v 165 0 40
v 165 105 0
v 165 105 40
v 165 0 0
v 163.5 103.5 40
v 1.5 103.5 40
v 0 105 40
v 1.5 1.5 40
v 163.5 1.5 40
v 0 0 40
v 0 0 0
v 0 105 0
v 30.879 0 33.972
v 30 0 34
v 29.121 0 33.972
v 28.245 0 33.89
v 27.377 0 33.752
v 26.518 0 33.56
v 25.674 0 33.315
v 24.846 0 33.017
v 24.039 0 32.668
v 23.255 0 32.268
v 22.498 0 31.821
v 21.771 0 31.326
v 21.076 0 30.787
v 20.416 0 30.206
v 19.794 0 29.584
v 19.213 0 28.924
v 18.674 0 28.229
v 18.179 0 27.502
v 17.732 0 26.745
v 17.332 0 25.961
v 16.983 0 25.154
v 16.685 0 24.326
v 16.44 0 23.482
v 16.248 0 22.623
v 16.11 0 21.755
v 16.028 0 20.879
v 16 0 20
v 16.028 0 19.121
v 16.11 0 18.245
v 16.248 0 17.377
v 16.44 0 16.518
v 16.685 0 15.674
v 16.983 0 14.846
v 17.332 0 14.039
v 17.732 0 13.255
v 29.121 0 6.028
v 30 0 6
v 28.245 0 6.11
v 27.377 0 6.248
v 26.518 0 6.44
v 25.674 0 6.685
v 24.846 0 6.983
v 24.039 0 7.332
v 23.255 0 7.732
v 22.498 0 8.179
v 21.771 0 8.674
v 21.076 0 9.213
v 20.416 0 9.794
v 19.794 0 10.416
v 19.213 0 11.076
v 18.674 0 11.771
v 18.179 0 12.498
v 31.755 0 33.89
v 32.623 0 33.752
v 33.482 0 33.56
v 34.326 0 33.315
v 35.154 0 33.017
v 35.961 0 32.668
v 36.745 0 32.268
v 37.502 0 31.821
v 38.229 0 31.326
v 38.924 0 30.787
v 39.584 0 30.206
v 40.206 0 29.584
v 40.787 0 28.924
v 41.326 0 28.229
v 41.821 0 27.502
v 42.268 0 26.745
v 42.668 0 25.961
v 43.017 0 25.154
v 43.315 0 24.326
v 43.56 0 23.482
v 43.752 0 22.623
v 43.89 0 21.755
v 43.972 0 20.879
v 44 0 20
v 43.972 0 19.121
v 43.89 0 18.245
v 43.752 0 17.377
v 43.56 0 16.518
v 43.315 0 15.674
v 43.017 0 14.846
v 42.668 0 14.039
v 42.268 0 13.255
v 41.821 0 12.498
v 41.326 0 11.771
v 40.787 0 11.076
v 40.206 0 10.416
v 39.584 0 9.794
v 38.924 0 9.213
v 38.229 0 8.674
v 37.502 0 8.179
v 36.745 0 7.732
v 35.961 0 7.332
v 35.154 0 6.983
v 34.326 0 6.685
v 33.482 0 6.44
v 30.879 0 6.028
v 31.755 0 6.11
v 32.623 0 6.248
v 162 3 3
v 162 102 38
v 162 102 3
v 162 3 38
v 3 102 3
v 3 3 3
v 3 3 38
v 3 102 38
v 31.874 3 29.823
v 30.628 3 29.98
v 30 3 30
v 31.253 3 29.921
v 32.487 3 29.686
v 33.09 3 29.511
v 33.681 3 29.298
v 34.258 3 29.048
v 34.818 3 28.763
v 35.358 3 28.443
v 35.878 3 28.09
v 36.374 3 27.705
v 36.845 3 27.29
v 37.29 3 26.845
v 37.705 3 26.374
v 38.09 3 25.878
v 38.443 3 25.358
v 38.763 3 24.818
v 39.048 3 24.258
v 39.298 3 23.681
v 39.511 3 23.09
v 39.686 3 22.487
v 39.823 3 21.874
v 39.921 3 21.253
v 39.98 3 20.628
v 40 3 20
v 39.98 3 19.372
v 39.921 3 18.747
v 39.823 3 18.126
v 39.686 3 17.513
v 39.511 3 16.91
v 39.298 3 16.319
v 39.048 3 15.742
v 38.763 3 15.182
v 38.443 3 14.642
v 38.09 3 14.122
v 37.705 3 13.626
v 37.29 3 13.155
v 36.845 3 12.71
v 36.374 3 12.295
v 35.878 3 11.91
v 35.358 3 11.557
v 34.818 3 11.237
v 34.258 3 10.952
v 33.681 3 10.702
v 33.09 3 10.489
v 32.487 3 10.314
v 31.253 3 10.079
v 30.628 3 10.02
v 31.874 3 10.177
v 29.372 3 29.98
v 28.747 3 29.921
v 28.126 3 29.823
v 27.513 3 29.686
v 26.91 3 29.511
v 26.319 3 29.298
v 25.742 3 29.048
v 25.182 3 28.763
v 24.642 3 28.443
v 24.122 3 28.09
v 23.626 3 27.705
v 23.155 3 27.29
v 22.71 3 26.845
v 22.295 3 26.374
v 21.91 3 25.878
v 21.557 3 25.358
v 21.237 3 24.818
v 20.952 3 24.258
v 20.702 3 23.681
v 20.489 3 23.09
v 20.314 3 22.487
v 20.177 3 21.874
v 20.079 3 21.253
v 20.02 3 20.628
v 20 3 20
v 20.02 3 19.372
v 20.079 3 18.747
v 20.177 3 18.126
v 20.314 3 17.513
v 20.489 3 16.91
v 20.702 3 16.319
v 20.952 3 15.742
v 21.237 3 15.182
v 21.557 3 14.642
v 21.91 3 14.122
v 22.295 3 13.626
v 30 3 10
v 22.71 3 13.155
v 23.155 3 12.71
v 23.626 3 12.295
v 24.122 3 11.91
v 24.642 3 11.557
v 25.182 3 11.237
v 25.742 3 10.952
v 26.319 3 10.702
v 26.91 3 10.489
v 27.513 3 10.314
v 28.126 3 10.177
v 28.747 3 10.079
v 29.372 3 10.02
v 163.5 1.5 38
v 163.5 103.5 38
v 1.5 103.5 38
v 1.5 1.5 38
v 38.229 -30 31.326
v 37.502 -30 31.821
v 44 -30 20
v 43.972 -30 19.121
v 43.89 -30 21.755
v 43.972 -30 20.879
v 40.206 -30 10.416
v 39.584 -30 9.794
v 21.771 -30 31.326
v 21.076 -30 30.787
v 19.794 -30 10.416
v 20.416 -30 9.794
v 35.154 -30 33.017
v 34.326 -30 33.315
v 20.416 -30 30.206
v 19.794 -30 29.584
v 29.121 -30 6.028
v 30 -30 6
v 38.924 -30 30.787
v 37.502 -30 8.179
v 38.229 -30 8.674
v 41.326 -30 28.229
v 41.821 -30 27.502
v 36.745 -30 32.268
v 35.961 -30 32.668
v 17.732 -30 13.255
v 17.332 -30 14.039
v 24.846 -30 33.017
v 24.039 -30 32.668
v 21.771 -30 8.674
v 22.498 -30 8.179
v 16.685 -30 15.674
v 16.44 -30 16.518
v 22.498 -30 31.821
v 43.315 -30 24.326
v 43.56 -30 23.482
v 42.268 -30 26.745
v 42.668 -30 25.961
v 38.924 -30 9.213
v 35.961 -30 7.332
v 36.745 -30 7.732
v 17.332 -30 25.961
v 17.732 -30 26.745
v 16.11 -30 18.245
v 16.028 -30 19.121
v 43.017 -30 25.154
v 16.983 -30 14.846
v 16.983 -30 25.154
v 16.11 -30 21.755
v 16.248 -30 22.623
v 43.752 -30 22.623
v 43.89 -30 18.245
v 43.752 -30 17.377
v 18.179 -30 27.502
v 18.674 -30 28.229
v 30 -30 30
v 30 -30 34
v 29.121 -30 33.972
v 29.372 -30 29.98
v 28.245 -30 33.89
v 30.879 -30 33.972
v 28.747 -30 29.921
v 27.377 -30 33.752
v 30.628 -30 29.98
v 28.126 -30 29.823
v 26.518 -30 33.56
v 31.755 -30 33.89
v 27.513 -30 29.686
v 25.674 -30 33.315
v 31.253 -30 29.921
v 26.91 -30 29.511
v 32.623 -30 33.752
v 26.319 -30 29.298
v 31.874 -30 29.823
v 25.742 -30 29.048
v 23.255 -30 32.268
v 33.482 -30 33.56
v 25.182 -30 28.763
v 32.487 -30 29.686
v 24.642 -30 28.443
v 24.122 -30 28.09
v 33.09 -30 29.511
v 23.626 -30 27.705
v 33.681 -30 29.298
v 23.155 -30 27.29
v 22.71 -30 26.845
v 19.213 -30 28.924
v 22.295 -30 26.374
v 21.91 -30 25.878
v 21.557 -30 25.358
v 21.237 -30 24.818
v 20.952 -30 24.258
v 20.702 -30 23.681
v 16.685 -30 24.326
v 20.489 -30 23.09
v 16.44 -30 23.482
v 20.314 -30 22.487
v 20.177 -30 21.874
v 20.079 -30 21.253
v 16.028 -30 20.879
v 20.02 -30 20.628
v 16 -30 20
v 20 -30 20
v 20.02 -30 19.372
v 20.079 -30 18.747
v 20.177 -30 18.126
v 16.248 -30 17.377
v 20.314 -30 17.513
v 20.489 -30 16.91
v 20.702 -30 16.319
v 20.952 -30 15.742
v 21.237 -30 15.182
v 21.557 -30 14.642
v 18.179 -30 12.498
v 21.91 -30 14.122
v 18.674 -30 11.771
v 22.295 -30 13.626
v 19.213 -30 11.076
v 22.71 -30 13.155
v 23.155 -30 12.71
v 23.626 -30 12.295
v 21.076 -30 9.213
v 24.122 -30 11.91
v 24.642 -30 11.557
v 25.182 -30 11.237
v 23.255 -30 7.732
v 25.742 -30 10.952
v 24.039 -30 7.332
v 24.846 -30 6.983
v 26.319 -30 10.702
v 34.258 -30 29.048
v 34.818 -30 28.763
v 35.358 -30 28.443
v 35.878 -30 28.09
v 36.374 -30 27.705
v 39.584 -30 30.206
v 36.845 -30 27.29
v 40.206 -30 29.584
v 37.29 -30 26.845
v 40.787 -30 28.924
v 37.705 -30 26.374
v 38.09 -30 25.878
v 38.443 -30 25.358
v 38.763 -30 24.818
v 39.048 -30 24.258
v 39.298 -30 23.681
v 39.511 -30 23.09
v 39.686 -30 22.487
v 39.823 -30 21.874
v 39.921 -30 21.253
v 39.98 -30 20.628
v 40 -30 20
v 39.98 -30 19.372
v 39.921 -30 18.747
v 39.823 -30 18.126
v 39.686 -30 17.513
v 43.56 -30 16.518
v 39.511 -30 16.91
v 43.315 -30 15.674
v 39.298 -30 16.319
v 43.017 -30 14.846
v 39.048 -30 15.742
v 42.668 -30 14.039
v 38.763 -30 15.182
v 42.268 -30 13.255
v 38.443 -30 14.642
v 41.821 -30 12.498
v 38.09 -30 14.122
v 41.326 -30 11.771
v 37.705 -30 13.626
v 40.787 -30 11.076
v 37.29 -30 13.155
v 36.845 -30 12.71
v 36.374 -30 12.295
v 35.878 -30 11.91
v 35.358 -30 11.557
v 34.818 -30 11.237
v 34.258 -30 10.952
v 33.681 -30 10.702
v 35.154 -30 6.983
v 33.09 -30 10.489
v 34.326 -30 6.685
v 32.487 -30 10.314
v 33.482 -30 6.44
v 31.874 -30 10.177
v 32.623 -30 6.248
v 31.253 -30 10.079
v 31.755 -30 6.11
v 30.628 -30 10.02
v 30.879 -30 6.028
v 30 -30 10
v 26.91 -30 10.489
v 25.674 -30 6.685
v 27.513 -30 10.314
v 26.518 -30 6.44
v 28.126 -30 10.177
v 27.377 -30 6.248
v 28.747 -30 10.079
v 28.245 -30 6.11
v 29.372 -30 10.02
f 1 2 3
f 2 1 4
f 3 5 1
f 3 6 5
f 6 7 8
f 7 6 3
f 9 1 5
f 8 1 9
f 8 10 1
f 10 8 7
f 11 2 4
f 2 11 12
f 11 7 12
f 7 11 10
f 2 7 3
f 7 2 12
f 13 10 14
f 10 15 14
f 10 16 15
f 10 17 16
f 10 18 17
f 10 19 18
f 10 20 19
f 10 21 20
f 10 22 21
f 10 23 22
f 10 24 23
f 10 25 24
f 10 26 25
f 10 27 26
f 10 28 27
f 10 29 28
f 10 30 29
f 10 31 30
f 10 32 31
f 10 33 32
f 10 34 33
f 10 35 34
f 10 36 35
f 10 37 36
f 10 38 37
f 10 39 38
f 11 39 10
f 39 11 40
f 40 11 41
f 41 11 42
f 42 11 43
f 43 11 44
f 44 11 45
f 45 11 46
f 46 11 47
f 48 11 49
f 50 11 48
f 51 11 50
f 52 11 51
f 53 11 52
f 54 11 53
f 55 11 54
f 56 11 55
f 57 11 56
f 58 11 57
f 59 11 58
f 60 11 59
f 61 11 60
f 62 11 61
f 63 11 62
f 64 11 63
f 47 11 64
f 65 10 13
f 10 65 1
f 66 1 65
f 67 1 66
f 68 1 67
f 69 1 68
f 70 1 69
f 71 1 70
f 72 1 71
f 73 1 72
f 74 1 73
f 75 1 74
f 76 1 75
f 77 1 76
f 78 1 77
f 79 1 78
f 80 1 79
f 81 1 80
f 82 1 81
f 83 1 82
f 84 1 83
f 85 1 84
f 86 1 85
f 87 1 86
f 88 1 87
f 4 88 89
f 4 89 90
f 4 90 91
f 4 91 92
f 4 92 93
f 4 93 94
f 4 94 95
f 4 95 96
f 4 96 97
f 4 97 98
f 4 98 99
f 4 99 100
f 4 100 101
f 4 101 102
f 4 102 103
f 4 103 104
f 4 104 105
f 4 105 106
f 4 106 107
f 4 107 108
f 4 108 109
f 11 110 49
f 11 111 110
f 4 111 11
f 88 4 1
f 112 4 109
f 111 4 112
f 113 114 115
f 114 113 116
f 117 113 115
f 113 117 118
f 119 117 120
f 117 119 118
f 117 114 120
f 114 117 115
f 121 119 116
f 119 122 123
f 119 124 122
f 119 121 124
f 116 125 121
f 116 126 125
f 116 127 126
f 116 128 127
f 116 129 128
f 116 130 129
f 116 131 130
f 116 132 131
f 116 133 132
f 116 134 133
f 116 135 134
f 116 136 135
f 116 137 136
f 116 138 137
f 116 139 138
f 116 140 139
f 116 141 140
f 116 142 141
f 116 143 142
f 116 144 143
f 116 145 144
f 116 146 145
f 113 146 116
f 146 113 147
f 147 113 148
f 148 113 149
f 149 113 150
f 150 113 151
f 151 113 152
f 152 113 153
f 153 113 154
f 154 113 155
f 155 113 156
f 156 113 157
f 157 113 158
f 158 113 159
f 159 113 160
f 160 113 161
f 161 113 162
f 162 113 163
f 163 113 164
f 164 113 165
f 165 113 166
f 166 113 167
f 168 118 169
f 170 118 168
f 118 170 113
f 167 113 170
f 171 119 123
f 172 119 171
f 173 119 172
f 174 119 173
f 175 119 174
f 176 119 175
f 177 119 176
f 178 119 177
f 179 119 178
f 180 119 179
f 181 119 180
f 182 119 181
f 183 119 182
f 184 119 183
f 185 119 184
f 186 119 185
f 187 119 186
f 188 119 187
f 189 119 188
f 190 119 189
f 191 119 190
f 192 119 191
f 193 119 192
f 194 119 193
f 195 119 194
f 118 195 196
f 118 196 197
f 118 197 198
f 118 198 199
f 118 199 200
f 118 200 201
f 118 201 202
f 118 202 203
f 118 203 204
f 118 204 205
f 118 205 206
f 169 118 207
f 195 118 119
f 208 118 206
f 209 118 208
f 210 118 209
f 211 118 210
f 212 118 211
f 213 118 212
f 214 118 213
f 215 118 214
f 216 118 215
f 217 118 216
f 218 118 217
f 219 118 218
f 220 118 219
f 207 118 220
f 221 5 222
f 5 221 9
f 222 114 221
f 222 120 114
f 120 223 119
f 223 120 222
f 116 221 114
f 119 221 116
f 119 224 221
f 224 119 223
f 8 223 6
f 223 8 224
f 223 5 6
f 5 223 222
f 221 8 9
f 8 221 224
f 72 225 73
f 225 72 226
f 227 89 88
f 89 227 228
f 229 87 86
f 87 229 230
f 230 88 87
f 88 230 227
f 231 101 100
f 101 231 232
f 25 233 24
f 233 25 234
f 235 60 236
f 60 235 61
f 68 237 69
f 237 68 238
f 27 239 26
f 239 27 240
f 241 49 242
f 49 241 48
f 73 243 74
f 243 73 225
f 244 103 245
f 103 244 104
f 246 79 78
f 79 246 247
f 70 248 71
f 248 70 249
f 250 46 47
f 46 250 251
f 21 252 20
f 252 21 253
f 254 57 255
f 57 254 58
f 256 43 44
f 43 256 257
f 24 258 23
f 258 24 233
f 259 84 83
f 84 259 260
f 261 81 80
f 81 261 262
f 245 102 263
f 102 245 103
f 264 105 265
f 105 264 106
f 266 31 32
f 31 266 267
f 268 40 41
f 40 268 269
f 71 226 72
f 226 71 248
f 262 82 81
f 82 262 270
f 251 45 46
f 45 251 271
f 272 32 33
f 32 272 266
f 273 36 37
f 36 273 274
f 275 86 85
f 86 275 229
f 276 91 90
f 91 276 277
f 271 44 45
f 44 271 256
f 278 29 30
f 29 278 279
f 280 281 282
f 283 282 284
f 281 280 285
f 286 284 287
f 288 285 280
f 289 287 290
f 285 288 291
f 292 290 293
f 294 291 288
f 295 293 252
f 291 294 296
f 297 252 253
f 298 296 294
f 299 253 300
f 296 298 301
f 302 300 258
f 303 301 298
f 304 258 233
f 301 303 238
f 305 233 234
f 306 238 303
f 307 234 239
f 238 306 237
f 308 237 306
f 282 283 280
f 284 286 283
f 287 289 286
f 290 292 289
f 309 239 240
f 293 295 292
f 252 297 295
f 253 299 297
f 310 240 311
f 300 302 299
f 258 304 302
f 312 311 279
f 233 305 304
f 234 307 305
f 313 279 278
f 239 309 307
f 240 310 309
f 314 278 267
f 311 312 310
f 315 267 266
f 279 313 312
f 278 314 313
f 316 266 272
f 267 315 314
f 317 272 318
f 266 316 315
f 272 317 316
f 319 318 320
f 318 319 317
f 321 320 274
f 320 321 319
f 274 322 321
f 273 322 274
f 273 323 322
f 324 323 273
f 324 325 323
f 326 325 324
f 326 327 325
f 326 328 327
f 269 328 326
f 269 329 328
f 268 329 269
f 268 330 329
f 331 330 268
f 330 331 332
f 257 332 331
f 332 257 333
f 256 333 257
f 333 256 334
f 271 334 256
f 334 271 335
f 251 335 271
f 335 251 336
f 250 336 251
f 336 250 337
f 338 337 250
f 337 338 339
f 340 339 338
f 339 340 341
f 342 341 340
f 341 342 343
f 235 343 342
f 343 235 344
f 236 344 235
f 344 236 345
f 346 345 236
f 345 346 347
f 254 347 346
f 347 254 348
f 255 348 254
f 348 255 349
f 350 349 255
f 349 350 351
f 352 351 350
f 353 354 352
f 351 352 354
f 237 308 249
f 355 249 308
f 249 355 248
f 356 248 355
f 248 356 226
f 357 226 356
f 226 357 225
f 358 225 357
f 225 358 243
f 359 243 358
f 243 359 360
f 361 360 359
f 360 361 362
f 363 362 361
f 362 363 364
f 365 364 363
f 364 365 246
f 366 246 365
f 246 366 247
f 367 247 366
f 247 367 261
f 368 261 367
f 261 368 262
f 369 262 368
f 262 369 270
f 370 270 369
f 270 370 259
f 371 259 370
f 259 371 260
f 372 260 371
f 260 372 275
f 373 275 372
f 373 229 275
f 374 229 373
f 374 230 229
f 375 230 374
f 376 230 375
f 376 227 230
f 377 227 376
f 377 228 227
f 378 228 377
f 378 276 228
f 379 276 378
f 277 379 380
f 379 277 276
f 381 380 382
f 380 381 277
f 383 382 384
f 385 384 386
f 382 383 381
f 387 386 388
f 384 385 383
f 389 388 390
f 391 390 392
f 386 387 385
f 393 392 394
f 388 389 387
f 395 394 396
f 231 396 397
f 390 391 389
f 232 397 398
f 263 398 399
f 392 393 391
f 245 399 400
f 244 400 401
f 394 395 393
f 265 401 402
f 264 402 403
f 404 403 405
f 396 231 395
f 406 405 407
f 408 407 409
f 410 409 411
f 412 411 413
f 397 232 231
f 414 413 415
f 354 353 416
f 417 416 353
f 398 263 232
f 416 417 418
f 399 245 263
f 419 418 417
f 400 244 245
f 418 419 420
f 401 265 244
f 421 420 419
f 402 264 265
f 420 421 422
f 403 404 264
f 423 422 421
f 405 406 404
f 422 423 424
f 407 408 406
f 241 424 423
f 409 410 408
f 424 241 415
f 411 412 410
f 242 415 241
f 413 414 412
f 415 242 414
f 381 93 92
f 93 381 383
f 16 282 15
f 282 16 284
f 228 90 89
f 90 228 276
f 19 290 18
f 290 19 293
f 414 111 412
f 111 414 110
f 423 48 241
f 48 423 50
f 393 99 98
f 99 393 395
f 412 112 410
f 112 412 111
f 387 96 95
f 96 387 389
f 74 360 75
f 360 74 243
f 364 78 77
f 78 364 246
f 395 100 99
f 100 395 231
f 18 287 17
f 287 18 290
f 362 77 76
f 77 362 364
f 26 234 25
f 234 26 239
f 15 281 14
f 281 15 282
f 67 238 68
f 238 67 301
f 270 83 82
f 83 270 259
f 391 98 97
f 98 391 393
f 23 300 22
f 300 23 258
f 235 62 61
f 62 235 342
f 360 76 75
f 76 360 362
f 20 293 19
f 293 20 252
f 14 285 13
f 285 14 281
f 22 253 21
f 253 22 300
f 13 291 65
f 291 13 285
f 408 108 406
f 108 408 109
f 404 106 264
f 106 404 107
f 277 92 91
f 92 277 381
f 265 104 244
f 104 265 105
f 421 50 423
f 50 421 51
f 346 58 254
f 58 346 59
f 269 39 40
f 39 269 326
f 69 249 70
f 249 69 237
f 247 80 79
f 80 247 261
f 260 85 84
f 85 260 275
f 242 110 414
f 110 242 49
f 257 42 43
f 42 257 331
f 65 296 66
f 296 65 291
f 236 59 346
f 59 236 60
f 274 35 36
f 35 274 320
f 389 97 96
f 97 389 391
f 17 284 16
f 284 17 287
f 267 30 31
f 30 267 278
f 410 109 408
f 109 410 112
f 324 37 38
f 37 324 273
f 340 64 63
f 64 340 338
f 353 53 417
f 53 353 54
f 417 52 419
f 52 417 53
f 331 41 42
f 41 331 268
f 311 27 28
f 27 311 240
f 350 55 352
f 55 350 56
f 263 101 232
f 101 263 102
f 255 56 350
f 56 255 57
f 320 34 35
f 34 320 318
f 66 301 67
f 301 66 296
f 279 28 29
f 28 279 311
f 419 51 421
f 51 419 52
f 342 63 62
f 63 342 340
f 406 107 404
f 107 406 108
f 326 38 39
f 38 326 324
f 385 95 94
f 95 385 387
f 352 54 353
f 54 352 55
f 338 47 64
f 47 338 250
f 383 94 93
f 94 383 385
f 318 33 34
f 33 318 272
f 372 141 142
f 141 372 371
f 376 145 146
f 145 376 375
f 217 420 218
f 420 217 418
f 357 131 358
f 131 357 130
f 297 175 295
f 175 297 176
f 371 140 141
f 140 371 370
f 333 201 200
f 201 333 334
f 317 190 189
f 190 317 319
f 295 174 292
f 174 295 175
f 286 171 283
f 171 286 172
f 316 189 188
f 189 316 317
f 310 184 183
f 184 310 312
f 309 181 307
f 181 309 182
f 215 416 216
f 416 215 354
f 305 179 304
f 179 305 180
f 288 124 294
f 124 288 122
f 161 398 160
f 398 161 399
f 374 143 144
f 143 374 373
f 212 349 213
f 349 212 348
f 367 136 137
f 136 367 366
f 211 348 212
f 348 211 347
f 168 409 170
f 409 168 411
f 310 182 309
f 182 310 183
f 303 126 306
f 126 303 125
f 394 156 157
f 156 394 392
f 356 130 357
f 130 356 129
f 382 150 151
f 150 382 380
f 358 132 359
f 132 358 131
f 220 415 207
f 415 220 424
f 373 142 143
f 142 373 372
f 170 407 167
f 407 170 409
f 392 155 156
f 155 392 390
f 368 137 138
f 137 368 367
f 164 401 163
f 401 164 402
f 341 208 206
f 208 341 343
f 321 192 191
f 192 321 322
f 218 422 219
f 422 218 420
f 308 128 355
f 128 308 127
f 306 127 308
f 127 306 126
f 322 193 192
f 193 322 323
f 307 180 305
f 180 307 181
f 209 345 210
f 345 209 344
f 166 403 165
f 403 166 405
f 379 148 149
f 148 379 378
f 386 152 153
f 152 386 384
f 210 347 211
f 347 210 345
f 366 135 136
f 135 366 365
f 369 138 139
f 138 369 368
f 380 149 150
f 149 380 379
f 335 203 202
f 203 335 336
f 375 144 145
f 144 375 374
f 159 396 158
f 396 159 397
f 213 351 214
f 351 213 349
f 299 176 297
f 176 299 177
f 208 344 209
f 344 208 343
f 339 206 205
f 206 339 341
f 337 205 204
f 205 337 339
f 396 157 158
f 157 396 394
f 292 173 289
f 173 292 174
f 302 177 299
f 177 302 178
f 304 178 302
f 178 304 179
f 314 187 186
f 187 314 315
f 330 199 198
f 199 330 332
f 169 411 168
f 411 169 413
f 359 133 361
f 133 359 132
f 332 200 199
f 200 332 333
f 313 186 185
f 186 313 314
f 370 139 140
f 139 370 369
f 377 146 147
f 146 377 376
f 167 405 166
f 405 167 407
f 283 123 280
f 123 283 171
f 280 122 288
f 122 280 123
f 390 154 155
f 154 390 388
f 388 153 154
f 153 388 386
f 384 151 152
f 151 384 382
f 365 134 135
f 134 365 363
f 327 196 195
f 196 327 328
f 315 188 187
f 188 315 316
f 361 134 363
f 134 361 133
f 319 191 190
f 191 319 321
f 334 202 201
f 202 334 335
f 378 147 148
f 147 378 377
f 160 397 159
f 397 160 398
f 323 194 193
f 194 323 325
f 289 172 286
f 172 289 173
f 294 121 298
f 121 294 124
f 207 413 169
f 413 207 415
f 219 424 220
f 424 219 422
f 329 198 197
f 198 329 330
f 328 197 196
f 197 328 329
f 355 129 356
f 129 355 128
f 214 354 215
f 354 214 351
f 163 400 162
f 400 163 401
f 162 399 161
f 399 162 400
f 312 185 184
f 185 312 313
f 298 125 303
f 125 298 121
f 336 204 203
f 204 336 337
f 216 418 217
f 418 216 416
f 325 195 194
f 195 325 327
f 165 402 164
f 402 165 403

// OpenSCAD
difference(){
   union(){
      difference(){
         cube([165,105,40]);
         translate([3,3,3]){
            cube([159,99,37]);
         }
         translate([1.5,1.5,38]){
            cube([162,102,2]);
         }
      }
      translate([30,0,20]) {
         rotate([90,0,0]) cylinder(r=14,h=30,$fn=100);
      }
   }
   translate([30,0,20]) {
        rotate([90,0,0]) {
           translate([0,0,-5]) cylinder(r=10,h=40,$fn=100);
        }
   }
}
